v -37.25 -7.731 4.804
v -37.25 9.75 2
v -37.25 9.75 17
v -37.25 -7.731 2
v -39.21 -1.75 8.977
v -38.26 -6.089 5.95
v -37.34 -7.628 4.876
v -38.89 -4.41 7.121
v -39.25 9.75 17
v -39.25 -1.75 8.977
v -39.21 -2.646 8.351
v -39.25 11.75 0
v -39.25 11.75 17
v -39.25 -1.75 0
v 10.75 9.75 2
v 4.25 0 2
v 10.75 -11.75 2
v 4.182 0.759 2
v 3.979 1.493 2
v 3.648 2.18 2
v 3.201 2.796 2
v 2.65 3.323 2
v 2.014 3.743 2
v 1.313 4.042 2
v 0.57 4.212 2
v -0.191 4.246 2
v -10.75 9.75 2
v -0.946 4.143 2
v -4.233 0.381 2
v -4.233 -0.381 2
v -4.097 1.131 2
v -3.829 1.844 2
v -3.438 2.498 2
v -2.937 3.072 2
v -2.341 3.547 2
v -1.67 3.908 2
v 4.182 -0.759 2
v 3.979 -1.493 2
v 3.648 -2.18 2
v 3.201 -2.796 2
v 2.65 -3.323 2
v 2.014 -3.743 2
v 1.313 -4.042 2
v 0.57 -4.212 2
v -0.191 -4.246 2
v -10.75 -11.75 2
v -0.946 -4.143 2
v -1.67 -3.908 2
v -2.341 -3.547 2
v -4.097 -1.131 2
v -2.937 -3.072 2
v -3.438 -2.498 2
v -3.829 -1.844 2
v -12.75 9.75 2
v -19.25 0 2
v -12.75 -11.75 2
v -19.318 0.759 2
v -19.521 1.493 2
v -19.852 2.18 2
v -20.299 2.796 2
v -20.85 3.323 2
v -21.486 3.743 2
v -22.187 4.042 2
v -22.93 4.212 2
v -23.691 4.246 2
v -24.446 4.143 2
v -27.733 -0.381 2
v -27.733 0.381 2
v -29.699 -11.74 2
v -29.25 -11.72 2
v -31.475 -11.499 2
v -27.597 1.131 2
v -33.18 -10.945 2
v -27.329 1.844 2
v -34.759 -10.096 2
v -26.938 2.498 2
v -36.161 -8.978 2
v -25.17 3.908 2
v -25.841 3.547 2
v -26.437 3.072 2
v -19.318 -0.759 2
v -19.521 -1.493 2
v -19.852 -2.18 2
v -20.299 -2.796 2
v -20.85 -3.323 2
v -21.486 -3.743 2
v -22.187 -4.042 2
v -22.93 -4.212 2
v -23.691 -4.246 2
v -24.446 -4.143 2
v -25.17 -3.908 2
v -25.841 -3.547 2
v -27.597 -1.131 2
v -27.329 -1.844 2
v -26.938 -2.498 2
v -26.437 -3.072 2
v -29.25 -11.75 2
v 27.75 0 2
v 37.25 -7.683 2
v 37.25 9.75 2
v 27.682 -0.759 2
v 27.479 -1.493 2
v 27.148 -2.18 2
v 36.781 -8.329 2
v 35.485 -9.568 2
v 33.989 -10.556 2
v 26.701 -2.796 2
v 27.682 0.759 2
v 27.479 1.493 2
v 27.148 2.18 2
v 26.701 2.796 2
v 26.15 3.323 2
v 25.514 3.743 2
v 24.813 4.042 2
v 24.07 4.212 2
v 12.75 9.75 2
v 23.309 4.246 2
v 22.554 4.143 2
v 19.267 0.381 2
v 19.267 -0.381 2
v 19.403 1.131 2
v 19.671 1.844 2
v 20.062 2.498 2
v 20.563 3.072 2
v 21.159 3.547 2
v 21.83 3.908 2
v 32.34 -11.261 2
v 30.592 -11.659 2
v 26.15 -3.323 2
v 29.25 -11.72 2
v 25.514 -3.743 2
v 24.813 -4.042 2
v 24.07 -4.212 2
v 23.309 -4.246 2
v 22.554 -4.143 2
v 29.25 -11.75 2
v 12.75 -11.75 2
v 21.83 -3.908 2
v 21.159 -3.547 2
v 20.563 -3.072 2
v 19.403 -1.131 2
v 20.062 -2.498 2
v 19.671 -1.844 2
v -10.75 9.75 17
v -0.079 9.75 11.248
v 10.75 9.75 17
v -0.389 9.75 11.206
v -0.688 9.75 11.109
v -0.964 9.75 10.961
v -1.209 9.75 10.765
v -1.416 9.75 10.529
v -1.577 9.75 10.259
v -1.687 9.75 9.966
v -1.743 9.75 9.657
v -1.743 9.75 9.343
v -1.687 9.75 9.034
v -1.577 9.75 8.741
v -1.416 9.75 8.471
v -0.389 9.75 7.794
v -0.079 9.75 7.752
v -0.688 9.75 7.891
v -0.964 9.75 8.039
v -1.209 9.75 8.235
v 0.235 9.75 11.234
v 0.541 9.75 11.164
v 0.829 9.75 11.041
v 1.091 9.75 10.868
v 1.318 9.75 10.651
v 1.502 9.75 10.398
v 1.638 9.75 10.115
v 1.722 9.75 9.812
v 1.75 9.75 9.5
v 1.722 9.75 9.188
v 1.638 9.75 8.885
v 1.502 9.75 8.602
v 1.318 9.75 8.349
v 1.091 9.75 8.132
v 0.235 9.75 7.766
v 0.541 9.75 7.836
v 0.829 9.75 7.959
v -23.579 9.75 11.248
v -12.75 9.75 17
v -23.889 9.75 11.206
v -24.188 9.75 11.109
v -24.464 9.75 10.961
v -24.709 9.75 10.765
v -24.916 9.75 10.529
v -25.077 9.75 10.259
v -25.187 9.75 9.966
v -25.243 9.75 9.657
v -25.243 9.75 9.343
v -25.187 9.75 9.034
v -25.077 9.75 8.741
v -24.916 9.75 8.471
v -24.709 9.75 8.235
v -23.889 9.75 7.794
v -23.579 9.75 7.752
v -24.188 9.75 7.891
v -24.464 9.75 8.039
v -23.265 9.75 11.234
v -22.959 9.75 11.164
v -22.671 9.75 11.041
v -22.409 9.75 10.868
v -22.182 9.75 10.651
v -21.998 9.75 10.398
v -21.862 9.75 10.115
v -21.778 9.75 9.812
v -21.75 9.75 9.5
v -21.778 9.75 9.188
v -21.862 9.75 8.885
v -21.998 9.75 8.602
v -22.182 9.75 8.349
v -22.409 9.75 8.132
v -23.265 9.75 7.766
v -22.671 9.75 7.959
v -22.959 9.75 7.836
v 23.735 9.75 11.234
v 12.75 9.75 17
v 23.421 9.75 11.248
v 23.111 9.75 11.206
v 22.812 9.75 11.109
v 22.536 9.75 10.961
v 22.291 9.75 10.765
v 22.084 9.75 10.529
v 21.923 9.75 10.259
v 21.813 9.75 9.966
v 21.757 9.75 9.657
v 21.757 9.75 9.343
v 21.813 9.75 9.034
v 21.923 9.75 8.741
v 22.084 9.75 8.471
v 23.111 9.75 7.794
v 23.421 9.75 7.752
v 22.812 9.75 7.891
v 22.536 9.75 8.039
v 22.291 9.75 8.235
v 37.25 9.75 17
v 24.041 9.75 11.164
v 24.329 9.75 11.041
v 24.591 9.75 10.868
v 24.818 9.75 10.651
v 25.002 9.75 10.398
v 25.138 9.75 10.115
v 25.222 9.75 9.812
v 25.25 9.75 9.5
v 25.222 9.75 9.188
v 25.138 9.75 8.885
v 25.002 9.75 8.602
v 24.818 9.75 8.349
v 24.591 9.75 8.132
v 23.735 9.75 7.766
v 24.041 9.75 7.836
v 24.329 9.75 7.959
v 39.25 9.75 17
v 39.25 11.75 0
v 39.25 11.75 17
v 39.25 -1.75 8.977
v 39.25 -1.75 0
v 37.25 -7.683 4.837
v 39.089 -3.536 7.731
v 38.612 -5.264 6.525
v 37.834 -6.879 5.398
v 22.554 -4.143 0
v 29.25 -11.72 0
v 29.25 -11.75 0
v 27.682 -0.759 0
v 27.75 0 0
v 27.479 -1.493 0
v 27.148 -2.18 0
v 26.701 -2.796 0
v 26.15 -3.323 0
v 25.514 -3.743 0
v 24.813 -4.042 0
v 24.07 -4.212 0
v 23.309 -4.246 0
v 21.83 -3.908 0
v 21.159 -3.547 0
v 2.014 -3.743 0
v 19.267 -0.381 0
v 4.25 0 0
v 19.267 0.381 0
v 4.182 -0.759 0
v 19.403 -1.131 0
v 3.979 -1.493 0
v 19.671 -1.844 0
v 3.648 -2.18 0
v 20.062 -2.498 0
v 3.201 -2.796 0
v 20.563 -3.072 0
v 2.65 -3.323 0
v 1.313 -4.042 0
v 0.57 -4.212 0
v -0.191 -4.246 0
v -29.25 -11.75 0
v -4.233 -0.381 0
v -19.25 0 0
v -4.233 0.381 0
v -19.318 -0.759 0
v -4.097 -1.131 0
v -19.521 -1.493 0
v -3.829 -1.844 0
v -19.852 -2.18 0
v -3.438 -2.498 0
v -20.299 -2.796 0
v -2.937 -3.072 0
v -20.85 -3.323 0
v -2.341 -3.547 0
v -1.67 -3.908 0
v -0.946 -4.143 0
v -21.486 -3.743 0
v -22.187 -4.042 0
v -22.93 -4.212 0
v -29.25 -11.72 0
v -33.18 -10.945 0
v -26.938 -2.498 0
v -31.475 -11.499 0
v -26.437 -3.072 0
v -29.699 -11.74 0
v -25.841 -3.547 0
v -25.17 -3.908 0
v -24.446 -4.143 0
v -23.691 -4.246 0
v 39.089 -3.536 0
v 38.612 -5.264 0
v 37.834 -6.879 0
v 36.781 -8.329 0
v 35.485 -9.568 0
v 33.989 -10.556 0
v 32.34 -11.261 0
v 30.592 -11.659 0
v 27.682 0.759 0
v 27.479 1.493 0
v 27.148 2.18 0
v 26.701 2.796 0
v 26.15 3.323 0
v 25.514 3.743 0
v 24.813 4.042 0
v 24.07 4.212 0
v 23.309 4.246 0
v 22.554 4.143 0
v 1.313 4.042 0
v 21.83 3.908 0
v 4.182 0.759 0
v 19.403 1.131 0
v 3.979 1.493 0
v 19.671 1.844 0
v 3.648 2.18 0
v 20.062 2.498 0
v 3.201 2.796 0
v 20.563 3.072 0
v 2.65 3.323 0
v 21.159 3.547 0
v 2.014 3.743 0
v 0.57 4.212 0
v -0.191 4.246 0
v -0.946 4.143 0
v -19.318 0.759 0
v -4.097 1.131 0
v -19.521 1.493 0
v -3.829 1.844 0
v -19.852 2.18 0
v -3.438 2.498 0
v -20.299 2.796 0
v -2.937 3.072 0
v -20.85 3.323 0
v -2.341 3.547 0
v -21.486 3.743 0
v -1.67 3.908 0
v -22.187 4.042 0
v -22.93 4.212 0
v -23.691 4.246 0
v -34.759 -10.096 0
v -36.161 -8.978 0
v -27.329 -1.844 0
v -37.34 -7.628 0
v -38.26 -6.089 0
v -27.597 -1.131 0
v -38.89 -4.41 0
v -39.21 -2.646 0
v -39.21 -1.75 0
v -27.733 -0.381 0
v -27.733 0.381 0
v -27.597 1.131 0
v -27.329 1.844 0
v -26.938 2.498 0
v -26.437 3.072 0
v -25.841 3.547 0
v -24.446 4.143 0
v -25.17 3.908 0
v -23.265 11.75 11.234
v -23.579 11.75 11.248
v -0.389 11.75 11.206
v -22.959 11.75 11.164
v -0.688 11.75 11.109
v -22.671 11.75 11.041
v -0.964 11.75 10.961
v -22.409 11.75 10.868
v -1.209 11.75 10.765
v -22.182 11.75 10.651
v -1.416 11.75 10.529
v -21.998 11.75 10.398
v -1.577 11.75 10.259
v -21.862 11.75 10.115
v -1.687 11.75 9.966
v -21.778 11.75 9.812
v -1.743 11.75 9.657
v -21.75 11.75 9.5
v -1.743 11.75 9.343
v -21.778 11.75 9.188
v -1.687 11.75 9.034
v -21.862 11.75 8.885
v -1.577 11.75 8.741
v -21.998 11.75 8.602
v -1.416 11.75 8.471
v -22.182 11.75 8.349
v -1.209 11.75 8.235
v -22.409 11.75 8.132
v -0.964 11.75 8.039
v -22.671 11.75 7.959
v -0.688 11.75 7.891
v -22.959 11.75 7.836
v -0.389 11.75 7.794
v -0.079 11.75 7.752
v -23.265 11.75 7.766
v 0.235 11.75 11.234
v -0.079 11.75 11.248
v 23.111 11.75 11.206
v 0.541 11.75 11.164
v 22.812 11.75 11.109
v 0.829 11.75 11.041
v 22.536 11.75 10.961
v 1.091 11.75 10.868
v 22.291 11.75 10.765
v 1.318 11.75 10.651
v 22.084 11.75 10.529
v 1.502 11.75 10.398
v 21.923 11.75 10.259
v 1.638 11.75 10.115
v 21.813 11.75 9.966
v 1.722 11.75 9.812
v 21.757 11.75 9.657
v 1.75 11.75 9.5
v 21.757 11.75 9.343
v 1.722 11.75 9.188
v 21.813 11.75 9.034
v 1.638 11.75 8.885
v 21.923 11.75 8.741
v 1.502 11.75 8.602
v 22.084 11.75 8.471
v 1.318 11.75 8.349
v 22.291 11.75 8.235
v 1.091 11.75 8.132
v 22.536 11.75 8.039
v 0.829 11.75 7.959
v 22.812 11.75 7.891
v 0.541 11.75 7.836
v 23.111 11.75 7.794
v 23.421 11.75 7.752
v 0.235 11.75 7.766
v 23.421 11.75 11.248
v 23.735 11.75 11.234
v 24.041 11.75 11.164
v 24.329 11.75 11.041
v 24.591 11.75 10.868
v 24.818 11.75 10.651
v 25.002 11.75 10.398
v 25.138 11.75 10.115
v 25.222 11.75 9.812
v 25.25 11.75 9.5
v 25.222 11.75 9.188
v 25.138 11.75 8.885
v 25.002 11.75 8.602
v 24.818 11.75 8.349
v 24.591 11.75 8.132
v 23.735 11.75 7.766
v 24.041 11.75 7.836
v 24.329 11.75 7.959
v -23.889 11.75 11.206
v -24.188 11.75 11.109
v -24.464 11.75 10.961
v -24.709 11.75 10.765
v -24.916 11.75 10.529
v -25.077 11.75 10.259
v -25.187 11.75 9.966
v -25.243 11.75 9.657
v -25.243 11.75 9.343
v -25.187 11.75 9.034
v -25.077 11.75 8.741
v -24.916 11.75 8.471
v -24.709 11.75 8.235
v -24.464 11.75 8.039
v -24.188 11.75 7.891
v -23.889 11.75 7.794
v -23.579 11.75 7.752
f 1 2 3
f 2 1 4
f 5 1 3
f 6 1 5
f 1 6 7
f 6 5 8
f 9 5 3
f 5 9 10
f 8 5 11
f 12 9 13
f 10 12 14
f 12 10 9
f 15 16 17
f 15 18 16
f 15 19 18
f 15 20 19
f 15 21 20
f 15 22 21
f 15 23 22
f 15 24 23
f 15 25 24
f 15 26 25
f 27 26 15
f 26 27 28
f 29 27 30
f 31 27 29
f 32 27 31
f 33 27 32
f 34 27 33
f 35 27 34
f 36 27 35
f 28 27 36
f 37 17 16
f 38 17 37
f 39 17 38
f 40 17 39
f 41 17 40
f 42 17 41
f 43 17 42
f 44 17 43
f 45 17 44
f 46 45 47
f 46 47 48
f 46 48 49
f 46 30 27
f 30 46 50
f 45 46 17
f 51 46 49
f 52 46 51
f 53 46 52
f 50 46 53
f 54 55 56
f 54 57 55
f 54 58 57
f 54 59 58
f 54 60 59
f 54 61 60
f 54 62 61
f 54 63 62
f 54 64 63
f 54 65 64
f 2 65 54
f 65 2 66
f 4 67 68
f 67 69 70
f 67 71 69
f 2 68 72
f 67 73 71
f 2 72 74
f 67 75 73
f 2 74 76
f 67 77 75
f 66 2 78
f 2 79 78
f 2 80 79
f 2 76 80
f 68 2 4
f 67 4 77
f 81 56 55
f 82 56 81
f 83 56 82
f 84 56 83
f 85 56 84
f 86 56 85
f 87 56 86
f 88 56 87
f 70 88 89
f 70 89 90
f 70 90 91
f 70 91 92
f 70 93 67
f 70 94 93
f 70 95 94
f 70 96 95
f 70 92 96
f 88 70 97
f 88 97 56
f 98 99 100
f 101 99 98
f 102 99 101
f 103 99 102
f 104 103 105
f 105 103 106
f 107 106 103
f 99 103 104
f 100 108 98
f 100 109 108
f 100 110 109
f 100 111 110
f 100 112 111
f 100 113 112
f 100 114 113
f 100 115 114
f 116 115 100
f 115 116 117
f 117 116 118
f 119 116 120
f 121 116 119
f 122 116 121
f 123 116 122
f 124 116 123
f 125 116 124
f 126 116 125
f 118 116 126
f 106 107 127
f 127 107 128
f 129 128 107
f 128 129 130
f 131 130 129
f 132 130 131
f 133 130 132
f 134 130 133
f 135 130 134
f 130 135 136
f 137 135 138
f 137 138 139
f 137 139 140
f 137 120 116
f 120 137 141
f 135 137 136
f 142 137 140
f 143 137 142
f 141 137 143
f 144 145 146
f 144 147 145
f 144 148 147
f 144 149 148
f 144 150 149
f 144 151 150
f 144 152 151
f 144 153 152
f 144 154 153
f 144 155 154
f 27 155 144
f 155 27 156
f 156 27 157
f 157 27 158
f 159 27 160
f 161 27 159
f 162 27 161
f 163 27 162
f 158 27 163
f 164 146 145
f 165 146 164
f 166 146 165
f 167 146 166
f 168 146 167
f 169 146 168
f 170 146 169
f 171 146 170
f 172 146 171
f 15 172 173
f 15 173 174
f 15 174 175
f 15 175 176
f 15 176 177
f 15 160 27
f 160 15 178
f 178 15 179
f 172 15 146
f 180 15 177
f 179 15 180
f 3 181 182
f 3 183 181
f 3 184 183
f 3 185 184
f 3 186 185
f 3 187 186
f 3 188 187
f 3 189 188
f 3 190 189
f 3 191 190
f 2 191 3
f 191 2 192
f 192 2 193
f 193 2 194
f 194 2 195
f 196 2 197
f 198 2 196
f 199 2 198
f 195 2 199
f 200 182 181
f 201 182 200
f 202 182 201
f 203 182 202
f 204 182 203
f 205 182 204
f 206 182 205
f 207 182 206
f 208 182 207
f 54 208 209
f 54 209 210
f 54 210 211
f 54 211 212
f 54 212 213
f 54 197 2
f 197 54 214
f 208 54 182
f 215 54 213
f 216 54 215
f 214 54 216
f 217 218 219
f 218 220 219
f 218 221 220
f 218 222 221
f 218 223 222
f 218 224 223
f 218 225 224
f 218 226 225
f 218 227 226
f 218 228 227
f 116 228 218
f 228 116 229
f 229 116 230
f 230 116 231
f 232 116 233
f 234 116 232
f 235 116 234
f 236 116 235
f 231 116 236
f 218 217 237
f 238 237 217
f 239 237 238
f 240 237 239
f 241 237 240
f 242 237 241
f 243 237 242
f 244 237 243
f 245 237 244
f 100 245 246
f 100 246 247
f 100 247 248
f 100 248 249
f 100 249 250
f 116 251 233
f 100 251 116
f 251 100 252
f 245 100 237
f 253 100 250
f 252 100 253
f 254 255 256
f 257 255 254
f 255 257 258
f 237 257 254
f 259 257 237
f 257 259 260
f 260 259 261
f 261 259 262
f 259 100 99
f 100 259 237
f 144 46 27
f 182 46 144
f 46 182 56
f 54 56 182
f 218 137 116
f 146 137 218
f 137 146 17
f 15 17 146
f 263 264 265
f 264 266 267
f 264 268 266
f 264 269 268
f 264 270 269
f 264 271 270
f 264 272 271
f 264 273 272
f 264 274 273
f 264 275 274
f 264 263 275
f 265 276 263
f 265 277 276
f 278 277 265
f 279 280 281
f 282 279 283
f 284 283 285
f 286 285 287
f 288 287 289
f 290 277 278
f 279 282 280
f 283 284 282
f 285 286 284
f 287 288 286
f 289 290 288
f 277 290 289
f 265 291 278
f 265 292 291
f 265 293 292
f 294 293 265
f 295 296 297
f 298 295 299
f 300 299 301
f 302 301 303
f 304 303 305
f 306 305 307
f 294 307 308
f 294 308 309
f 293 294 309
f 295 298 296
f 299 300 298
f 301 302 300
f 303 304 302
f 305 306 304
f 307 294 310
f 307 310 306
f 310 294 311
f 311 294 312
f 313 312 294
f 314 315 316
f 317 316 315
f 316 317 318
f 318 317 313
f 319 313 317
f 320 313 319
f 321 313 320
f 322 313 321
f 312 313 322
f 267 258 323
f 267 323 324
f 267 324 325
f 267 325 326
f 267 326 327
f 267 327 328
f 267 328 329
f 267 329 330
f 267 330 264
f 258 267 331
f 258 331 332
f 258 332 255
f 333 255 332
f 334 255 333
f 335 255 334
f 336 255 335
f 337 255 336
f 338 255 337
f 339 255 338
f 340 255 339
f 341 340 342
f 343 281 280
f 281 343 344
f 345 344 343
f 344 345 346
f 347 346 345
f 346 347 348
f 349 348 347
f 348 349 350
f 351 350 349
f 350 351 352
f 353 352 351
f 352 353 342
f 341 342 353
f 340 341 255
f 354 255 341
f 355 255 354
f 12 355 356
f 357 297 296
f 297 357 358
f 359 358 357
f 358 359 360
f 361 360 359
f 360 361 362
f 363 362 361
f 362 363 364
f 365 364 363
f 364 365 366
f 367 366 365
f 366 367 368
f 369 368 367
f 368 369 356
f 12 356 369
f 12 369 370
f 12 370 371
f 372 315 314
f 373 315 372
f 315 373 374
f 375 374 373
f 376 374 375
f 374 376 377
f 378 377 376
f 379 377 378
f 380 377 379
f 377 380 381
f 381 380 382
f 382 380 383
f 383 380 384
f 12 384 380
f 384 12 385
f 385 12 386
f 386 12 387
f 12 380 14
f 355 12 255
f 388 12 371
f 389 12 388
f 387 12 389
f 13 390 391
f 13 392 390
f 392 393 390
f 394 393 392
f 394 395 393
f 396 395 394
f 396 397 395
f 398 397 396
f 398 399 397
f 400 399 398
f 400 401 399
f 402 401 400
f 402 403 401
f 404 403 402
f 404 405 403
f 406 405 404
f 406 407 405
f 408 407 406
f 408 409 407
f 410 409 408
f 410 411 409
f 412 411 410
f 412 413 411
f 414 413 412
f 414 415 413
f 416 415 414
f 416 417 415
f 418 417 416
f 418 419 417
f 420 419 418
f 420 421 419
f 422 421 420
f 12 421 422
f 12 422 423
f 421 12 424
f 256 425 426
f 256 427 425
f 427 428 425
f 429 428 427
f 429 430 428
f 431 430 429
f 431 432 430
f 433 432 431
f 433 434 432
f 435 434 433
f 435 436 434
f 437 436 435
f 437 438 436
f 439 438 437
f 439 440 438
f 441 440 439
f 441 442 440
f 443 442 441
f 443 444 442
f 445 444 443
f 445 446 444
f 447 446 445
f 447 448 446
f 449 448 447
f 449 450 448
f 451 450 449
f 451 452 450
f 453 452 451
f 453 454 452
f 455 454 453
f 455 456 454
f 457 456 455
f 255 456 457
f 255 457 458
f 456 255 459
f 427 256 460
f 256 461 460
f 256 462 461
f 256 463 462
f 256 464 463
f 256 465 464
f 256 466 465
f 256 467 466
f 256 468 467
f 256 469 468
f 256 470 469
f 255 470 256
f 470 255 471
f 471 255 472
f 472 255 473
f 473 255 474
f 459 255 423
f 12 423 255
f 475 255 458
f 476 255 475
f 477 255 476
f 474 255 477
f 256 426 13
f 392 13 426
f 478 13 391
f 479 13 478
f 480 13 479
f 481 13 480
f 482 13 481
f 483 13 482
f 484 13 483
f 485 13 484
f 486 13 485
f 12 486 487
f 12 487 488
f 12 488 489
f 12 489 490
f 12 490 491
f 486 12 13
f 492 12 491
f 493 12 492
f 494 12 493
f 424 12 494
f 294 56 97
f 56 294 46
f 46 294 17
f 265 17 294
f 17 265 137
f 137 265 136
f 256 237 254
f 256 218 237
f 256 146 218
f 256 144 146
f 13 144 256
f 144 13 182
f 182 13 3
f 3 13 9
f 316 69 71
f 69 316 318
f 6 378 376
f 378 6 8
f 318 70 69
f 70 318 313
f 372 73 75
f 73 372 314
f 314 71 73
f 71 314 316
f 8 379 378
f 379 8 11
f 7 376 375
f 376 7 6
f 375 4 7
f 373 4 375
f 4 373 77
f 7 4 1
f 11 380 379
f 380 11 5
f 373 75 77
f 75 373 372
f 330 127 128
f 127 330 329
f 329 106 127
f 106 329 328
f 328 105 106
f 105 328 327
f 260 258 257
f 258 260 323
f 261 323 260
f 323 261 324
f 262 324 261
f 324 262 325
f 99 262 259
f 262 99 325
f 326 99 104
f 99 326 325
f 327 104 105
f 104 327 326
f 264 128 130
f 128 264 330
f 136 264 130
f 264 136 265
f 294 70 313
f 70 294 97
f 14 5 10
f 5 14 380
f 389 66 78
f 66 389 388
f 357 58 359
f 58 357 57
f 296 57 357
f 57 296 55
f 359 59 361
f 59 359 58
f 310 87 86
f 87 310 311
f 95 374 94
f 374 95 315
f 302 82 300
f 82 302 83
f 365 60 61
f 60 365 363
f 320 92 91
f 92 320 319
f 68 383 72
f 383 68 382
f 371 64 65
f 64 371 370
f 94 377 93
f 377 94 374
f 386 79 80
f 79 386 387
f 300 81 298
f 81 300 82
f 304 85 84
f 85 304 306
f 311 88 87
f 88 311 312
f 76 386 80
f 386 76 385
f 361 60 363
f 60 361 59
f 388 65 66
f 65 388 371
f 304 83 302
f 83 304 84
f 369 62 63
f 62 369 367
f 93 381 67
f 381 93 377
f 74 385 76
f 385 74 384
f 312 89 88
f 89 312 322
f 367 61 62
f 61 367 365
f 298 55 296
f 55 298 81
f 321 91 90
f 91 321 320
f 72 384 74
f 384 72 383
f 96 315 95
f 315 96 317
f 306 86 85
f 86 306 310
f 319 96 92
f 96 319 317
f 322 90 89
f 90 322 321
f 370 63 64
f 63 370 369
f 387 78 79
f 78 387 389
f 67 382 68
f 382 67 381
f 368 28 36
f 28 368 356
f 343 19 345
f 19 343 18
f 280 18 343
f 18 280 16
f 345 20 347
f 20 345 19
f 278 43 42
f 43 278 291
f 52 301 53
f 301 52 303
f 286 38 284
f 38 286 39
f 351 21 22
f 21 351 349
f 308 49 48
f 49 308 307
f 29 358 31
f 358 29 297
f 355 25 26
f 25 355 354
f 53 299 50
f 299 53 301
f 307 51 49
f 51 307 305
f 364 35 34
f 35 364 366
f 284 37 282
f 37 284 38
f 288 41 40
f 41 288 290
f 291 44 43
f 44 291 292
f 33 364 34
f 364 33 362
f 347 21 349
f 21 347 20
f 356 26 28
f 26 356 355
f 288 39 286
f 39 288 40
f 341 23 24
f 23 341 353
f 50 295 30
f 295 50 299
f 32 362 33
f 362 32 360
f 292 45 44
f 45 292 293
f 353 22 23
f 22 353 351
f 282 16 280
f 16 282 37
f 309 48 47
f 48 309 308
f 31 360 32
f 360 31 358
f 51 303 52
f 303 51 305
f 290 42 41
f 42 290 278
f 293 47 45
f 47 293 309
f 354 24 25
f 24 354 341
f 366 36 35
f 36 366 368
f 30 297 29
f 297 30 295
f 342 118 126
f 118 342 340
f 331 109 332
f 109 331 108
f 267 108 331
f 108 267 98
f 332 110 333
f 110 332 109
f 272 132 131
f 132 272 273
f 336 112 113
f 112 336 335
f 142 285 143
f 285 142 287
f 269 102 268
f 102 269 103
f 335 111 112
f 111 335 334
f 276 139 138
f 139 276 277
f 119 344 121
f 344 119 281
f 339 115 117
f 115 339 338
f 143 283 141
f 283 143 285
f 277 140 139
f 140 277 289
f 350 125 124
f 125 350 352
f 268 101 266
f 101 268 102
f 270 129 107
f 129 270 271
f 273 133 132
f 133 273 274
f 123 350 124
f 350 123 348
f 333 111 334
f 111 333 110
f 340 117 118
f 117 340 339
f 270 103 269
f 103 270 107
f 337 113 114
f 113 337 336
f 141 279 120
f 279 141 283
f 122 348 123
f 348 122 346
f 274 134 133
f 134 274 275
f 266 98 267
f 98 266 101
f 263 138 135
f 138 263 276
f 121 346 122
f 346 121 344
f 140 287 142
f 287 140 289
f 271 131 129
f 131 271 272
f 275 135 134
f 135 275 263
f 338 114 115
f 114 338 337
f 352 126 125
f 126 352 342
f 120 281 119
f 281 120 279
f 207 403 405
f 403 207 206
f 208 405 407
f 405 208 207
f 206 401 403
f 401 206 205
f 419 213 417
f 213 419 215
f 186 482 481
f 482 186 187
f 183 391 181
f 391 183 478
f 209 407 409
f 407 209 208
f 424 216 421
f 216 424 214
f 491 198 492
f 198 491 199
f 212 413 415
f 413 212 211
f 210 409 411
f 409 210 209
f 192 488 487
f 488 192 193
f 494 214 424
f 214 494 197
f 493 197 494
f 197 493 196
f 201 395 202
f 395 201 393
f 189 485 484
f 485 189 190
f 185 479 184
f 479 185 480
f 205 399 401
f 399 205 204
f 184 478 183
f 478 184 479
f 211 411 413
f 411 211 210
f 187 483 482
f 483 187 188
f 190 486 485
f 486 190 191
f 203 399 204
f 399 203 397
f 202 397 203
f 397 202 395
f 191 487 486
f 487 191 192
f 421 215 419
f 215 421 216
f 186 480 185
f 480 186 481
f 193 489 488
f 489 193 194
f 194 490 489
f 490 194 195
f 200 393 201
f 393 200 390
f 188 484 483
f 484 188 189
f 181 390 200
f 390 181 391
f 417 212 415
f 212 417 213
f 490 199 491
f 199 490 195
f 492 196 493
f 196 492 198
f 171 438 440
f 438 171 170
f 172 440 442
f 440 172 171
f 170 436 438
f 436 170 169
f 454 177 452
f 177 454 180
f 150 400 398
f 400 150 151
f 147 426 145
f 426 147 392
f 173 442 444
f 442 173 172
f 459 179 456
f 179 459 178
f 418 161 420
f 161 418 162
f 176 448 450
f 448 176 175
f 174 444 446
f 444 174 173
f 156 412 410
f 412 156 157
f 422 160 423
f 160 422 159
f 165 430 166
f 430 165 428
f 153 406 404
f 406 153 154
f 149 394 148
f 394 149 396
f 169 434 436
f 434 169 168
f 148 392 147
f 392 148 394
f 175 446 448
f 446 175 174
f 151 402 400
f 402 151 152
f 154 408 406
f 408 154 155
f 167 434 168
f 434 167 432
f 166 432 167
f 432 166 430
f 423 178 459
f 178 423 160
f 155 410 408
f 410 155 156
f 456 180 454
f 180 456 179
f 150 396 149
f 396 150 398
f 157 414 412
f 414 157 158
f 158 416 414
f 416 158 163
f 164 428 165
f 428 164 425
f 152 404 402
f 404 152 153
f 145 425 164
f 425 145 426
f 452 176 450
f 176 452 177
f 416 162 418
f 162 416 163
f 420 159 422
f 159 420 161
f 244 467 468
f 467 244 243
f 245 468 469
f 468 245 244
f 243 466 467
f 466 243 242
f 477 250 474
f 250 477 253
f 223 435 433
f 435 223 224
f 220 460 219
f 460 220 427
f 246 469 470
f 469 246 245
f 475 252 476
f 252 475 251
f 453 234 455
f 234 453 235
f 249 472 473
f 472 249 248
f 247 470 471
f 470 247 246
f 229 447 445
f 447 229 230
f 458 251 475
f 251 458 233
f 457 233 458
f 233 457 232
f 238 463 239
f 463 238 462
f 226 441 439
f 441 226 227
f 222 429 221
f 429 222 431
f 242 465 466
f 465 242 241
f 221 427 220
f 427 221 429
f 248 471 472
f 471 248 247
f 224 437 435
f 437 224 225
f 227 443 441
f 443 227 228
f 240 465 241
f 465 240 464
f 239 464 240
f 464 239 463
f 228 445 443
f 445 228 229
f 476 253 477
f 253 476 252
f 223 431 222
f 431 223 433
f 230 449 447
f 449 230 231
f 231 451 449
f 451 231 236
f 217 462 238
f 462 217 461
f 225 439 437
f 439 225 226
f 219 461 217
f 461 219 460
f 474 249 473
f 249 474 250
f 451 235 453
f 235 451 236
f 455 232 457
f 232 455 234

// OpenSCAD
/*
 * Plug Panel (Parametric), v0.42
 *
 * by Alex Franke (CodeCreations), Jan 2013
 * http://www.theFrankes.com
 * 
 * Licenced under Creative Commons Attribution - Non-Commercial - Share Alike 3.0 
 * 
 * DESCRIPTION: This is a parametric plug panel, allowing you to attach a set of 
 *   panel-mounted plugs. It includes some ribs for added strength, and it's fully 
 *   "inside-out" parametric, with the overall size driven by the sizes and distances 
 *   you choose for the details. It prints out the total dimensions. 
 * 
 * INSTRUCTIONS: Choose some values in the "User-defined values" section, render,
 *   and print. You may need to run the output through netfabb. 
 * 
 * v0.42, Jan 18, 2013: Initial Release.
 * 
 * TODO: 
 *   * None at this time
 */

/////////////////////////////////////////////////////////////////////////////
// User-defined values... 
/////////////////////////////////////////////////////////////////////////////

// The diameter of the holes for the plugs
holeDiameter = 8.5;

// Number of rows of holes in the panel 
rows = 1;

// Number of columns of holes in the panel 
columns = 3;

// How far apart the holes are from each other
separation = 15;

// The thickness of the panel, mouting bracket and ribs
thickness = 2;

// Extra width added to each side
xMargin = 4;

// Extra height added to the top and bottom
yMargin = 0;

// Rounding radius at the corners opposide the bracket
roundRadius = 10;

// The depth of the mounting bracket
mountingDepth = 15;

// The diameter of the mounting holes
mountHoleDiameter = 3.5;

// Overall curve quality
$fn = 35;


/////////////////////////////////////////////////////////////////////////////
// Some calculated values and helpful output... 
/////////////////////////////////////////////////////////////////////////////
X = 0 + 0;  // ignore in customizer
Y = 1 + 0;  // ignore in customizer
Z = 2 + 0;  // ignore in customizer
margin = [xMargin,yMargin]; 

totalSize = [
	(holeDiameter+separation)*columns+margin[X]*2, 
	(holeDiameter+separation)*rows+margin[Y]*2,
	mountingDepth+thickness
	];
holeDist = holeDiameter+separation; 

echo( str( "Total size is ", totalSize ) ); 

/////////////////////////////////////////////////////////////////////////////
// The code...
/////////////////////////////////////////////////////////////////////////////
difference() {

	intersection() {
		union() {
			// face plate
			translate([0,0,thickness/2]) 
				cube([totalSize[X], totalSize[Y], thickness], center=true);
	
			// mounting plate
			translate([0,totalSize[Y]/2-thickness/2,mountingDepth/2+thickness]) 
				cube([totalSize[X], thickness, mountingDepth], center=true);
	
			// outer supports 
			for(i=[-1,1]) 
				translate([i*(totalSize[X]-thickness)/2,totalSize[Y]/2-thickness,thickness]) 
					support();
	
			// inner supports 
			translate([-(holeDist*(columns-2)/2),0,0])
				for(x=[0:columns-2]) 
					translate([holeDist*x,totalSize[Y]/2-thickness,thickness]) 
						support();
		}

		// Rounded edges 
		translate([0,0,totalSize[Z]/2]) 
		union() {
			translate([0,roundRadius/2,0]) 
				cube([totalSize[X], totalSize[Y]-roundRadius, totalSize[Z]], center=true);
			translate([0,-totalSize[Y]/2--roundRadius,0]) {
				cube([totalSize[X]-roundRadius*2, roundRadius*2, totalSize[Z]], center=true);
				for(x=[-1,1]) {
					translate([(totalSize[0]/2-roundRadius)*x,0,0]) 
						cylinder(h=totalSize[Z], r=roundRadius, center=true); 
				}
			}
		}	
	}


	// front panel holes 
	translate([-(holeDist*(columns-1))/2,-(holeDist*(rows-1))/2,0]) 
		for(x=[0:columns-1], y=[0:rows-1]) {
			translate([x*(holeDiameter+separation), y*(holeDiameter+separation),thickness/2]) 
				cylinder(h=thickness+1, r=holeDiameter/2, center=true);
	}

	// Mounting holes 
	translate([-(holeDist*(columns-1))/2,totalSize[Y]/2,thickness+mountingDepth/2]) 
		rotate([90,0,0]) 
		for(x=[0:columns-1]) {
			translate([x*(holeDiameter+separation), 0, thickness/2]) 
				cylinder(h=thickness+1, r=mountHoleDiameter/2, center=true);
	}

}


/////////////////////////////////////////////////////////////////////////////
// The modules...
/////////////////////////////////////////////////////////////////////////////

module support() {
	rotate([90,0,-90]) 
		linear_extrude(height=thickness, center=true) 
			polygon(points=[[0,0],[0,mountingDepth],[totalSize[Y]-thickness,0]]);
}
